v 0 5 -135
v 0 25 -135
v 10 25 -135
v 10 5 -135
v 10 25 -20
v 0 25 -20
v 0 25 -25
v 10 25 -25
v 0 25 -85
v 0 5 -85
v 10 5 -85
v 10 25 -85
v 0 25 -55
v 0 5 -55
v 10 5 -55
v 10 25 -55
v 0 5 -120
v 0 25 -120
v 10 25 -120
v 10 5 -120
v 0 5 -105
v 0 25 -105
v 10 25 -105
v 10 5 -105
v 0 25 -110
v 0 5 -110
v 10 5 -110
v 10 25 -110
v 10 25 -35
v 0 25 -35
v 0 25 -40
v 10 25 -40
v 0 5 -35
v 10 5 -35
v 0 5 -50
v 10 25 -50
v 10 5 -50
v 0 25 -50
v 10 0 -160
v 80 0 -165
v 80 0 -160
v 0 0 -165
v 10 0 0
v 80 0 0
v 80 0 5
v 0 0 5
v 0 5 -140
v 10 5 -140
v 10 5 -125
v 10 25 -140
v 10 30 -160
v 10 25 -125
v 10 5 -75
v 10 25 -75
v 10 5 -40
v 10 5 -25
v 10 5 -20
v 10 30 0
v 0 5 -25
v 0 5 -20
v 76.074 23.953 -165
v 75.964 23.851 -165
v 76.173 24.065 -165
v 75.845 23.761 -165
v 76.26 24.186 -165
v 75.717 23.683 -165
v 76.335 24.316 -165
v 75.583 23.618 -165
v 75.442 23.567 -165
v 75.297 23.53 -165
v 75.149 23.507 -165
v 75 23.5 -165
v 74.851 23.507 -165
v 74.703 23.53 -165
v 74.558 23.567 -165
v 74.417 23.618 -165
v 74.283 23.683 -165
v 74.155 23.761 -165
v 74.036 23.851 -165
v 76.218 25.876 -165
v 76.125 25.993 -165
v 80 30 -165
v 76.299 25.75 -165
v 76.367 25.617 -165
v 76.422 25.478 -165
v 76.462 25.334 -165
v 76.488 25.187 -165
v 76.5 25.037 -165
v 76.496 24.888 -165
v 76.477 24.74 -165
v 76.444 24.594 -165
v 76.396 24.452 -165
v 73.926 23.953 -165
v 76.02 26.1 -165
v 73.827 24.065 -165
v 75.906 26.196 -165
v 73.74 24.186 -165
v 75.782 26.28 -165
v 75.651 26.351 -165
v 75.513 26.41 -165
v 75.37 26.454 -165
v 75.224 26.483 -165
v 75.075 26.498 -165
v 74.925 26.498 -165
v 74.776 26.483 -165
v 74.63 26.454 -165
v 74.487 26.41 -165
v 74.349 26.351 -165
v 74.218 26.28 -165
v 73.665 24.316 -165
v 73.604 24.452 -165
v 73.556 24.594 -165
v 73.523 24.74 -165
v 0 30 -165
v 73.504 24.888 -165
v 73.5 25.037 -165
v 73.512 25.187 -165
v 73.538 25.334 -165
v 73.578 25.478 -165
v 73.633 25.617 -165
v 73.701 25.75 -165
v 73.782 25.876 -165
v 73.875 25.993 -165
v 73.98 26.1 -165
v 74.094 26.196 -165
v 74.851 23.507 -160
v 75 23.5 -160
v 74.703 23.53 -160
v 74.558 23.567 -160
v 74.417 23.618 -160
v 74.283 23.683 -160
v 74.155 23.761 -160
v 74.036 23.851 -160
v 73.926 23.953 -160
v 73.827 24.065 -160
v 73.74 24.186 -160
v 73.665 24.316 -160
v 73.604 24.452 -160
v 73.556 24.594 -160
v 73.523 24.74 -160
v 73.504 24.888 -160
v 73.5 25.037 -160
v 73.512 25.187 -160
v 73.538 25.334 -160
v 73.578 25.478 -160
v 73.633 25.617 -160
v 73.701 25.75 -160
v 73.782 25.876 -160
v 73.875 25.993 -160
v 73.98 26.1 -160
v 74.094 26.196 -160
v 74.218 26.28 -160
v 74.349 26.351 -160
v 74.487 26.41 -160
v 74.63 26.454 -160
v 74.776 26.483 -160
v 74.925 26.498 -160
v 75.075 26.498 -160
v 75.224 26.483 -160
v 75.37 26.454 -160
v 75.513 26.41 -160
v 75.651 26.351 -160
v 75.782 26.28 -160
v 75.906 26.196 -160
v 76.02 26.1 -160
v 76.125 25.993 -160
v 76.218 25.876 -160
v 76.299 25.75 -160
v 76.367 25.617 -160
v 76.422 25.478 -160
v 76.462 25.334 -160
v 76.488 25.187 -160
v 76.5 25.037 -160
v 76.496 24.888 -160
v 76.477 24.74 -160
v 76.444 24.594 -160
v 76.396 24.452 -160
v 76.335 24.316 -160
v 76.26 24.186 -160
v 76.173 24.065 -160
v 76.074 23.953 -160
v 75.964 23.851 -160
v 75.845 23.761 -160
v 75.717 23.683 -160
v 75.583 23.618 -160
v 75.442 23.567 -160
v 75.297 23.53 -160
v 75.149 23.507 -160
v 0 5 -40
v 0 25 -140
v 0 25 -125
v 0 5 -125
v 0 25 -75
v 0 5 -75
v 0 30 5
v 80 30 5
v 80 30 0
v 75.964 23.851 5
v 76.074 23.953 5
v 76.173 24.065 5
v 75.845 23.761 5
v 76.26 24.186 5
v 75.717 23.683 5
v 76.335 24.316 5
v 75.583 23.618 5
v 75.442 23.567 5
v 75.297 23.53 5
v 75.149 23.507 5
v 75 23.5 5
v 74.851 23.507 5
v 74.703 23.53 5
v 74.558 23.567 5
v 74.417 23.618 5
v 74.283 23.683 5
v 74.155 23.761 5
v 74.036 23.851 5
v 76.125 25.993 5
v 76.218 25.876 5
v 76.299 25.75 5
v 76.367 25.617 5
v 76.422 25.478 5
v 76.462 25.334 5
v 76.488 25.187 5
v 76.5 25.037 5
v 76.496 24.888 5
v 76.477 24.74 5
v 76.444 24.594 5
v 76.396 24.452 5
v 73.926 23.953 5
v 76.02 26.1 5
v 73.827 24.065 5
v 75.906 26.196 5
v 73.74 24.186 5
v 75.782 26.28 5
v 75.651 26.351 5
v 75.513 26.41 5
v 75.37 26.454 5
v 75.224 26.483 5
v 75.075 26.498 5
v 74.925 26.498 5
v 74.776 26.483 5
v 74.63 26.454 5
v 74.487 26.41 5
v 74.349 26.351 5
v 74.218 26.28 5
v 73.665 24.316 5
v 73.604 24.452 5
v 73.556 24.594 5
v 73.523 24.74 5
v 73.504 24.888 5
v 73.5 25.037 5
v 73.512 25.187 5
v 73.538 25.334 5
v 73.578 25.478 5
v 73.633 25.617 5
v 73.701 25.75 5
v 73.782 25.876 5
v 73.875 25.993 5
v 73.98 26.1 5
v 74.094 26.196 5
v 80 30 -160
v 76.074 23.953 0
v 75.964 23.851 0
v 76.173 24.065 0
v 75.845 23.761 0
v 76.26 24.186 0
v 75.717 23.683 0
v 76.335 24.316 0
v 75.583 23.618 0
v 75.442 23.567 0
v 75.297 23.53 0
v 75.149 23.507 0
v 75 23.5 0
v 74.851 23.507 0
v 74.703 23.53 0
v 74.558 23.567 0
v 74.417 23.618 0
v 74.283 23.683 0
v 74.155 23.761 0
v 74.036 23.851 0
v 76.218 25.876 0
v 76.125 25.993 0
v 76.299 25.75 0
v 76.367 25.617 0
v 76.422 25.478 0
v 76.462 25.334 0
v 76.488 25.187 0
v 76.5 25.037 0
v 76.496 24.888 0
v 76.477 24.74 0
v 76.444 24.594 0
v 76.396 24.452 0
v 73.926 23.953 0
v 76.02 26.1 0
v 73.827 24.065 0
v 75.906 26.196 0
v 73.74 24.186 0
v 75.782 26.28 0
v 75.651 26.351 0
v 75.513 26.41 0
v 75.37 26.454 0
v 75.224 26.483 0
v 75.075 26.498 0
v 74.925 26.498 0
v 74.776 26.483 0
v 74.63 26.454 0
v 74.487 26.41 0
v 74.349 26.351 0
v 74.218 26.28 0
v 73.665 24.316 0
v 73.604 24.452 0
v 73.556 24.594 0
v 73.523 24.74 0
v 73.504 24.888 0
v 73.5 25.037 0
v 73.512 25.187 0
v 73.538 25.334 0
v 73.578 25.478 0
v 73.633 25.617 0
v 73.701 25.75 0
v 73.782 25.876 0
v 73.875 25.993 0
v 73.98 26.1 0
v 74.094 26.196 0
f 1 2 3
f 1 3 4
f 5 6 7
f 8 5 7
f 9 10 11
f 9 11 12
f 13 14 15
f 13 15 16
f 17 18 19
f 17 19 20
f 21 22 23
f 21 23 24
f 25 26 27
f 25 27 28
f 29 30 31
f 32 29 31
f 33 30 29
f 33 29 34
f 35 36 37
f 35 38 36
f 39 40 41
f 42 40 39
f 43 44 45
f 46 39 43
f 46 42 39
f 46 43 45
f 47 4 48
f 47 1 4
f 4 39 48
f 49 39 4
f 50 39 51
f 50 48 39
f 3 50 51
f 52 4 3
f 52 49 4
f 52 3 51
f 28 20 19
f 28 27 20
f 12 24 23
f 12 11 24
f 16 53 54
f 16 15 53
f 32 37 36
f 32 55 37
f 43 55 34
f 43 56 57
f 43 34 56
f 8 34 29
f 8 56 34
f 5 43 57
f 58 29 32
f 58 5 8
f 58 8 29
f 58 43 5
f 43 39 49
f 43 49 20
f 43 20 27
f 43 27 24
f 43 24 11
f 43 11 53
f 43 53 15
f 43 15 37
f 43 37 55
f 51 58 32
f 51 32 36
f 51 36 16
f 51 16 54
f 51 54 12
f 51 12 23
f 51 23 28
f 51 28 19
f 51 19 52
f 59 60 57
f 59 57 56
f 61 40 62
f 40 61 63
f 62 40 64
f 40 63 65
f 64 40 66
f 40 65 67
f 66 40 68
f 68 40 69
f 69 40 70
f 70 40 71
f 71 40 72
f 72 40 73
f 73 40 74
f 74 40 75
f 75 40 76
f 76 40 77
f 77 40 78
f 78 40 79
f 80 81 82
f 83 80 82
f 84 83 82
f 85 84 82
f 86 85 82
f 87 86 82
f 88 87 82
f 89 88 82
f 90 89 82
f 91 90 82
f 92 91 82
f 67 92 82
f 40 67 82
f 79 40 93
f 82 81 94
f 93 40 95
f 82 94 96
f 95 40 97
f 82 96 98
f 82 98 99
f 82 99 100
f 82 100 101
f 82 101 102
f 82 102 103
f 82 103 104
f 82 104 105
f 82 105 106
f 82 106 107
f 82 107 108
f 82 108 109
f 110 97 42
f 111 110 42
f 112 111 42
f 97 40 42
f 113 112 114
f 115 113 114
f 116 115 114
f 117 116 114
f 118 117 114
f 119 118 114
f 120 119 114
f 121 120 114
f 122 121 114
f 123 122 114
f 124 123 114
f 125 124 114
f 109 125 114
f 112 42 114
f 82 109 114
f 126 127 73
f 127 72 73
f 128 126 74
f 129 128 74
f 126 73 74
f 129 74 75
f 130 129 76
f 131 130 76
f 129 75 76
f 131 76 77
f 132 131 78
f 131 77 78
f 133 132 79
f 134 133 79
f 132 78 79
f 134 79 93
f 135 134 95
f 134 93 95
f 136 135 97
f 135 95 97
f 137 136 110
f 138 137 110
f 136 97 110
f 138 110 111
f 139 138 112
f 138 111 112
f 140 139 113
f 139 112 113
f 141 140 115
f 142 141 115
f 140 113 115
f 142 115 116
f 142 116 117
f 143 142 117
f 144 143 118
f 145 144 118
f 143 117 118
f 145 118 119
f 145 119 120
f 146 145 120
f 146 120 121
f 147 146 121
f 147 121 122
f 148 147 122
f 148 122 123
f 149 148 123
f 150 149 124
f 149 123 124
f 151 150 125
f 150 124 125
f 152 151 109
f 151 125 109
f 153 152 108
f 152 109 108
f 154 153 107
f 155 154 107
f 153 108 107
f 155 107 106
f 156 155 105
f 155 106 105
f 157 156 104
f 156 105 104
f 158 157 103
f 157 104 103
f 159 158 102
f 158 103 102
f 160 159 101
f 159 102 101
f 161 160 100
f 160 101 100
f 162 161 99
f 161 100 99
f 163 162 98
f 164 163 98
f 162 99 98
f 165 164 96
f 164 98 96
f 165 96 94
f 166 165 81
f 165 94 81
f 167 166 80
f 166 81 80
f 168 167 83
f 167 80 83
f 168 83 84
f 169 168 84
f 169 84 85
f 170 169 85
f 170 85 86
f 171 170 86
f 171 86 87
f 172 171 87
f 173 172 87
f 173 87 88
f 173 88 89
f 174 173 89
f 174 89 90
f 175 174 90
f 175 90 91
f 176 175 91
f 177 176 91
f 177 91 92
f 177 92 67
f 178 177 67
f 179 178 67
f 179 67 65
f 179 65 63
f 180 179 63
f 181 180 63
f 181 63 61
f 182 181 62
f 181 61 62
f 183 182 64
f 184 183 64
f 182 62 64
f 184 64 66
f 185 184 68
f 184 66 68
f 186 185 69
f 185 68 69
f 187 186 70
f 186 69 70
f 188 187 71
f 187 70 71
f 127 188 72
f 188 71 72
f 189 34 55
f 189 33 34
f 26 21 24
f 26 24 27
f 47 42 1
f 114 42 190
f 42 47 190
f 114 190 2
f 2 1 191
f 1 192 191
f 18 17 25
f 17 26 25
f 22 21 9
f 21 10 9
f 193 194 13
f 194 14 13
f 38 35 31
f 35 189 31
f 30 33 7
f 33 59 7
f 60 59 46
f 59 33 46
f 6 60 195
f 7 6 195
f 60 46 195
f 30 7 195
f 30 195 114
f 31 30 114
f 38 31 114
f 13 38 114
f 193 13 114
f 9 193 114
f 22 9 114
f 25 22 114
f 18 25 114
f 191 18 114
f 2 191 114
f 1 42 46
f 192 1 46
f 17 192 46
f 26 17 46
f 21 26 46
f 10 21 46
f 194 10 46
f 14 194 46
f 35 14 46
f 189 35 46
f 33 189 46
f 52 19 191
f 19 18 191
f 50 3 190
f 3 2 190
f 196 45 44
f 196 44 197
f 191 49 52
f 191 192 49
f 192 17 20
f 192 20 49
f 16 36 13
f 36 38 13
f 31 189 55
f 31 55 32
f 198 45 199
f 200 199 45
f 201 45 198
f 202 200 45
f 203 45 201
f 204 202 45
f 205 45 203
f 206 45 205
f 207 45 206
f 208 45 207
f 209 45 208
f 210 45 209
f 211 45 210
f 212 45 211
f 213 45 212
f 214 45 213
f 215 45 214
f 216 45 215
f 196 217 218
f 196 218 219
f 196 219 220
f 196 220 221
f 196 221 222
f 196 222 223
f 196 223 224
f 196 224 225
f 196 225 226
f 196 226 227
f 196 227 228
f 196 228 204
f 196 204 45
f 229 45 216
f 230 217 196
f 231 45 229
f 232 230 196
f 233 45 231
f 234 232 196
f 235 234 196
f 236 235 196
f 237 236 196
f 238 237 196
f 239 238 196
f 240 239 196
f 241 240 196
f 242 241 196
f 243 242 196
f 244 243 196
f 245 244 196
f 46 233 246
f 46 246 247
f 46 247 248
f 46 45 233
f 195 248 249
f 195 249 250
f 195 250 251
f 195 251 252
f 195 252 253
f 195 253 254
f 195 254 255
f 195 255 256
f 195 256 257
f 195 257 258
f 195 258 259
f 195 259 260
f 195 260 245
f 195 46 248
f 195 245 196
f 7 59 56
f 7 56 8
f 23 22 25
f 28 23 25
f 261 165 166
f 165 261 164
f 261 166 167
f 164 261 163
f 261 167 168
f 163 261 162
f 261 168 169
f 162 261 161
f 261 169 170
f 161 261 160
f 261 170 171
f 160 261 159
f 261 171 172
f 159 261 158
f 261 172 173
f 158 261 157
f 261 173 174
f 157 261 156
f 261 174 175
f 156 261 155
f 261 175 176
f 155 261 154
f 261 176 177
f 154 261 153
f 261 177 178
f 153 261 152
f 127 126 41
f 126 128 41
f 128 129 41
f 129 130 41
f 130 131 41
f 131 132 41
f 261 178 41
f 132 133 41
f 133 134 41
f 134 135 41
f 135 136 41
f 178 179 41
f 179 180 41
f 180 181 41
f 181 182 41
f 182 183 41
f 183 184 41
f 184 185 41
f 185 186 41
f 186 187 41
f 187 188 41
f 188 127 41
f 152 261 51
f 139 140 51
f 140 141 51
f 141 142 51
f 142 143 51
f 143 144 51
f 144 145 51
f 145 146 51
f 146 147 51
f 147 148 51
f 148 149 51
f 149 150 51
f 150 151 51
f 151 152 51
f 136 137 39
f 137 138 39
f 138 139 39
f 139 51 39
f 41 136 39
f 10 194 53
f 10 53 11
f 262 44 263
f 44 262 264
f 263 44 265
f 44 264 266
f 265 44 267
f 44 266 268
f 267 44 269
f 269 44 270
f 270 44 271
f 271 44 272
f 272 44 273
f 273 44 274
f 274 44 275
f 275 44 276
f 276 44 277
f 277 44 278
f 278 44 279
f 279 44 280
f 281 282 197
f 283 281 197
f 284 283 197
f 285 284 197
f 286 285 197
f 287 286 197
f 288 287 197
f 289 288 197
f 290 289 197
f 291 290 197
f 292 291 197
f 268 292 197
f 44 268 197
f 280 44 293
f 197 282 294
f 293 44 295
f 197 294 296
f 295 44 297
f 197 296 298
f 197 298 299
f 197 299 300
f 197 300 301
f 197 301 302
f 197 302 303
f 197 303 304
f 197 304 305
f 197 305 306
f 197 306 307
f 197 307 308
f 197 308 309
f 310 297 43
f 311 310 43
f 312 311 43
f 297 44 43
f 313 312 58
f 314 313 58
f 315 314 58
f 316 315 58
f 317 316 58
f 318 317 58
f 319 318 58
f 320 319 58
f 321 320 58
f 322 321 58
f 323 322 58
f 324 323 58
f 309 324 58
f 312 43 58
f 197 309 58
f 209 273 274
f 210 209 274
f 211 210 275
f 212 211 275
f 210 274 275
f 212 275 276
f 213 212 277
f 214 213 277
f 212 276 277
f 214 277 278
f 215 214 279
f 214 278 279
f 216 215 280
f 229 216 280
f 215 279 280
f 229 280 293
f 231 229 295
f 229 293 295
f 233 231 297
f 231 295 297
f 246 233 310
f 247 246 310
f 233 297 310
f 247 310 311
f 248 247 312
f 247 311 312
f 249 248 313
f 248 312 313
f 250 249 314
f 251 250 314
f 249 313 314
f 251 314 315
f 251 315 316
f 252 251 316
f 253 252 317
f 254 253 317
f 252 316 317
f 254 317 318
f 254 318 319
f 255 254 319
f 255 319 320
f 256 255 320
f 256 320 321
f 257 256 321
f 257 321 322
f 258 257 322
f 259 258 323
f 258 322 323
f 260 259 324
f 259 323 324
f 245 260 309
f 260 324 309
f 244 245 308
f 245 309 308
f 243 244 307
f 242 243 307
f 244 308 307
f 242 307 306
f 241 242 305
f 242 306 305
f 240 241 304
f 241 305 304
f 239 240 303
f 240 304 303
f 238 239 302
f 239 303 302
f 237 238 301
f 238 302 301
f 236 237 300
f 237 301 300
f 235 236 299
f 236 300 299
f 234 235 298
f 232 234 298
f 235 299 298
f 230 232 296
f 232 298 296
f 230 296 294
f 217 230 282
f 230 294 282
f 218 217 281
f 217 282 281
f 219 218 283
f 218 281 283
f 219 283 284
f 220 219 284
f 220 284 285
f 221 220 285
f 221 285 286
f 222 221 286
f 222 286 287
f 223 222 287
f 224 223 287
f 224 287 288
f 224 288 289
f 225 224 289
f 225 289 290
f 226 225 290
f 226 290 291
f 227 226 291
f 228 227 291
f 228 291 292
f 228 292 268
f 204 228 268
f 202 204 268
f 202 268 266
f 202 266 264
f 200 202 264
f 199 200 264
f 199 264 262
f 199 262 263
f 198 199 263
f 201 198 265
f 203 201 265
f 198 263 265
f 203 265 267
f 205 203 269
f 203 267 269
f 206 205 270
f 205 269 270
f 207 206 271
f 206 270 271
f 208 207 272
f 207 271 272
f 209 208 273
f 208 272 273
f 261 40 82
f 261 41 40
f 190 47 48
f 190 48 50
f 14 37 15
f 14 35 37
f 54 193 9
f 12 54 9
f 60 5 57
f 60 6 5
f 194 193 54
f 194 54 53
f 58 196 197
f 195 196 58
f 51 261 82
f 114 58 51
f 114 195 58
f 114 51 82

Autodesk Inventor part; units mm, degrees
ref_plane "YZ Plane" through (0, 0, 0) normal (1, 0, 0) x (0, 1, 0)
ref_plane "XZ Plane" through (0, 0, 0) normal (0, 1, 0) x (-1, 0, 0)
ref_plane "XY Plane" through (0, 0, 0) normal (0, 0, 1) x (1, 0, 0)
sketch "Sketch1" plane through (0, 0, 0) normal (1, 0, 0) x (0, 1, 0)
  line L0 (0, 0) -> (30, 0)
  line L1 (30, 0) -> (30, -160)
  line L2 (30, -160) -> (0, -160)
  line L3 (0, -160) -> (0, 0)
  line L4 (25, -20) -> (5, -20)
  line L5 (0, -20) -> (0, -25)
  line L6 (5, -25) -> (25, -25)
  line L7 (30, -25) -> (30, -20)
  line L8 (25, -35) -> (5, -35)
  line L9 (0, -35) -> (0, -40)
  line L10 (5, -40) -> (25, -40)
  line L11 (30, -40) -> (30, -35)
  line L12 (25, -50) -> (5, -50)
  line L13 (0, -50) -> (0, -55)
  line L14 (5, -55) -> (25, -55)
  line L15 (30, -55) -> (30, -50)
  line L16 (25, -75) -> (5, -75)
  line L17 (0, -75) -> (0, -85)
  line L18 (5, -85) -> (25, -85)
  line L19 (30, -85) -> (30, -75)
  line L20 (25, -105) -> (5, -105)
  line L21 (0, -105) -> (0, -110)
  line L22 (5, -110) -> (25, -110)
  line L23 (30, -110) -> (30, -105)
  line L24 (25, -120) -> (5, -120)
  line L25 (0, -120) -> (0, -125)
  line L26 (5, -125) -> (25, -125)
  line L27 (30, -125) -> (30, -120)
  line L28 (25, -135) -> (5, -135)
  line L29 (0, -135) -> (0, -140)
  line L30 (5, -140) -> (25, -140)
  line L31 (30, -140) -> (30, -135)
  line L32 (30, 0) -> (25, 0)
  line L33 (25, 0) -> (25, -160)
  line L34 (25, -160) -> (30, -160)
  line L35 (30, -160) -> (30, 0)
  line L36 (0, 0) -> (5, 0)
  line L37 (5, 0) -> (5, -160)
  line L38 (5, -160) -> (0, -160)
  line L39 (0, -160) -> (0, 0)
  line L40 (30, 0) -> (0, 0)
  line L41 (0, 0) -> (0, 5)
  line L42 (0, 5) -> (30, 5)
  line L43 (30, 5) -> (30, 0)
  line L44 (30, -160) -> (0, -160)
  line L45 (0, -160) -> (0, -165)
  line L46 (0, -165) -> (30, -165)
  line L47 (30, -165) -> (30, -160)
  dimension "d0" = 30
  dimension "d1" = 160
  dimension "d2" = 5
  dimension "d3" = 20
  dimension "d4" = 5
  dimension "d5" = 5
  dimension "d6" = 10
  dimension "d7" = 5
  dimension "d8" = 5
  dimension "d9" = 5
  dimension "d10" = 20
  dimension "d12" = 10
  dimension "d14" = 20
  dimension "d15" = 10
  dimension "d16" = 10
  dimension "d17" = 10
  dimension "d18" = 5
  dimension "d19" = 5
  dimension "d20" = 5
  dimension "d21" = 5
extrude "Extrusion1" add sketch "Sketch1" along normal blind 10 contours L0 L37 L2 L3 | L0 L33 L4 L37 | L0 L1 L2 L33 | L6 L33 L8 L37 | L10 L33 L12 L37 | L14 L33 L16 L37 | L18 L33 L20 L37 | L22 L33 L24 L37 | L26 L33 L28 L37 | L30 L33 L2 L37
extrude "Extrusion2" add sketch "Sketch1" along normal blind 80 contours L41 L42 L43 L0 | L2 L47 L46 L45
sketch "Sketch2" plane through (0, 0, 5) normal (0, 0, 1) x (1, 0, 0)
  line L0 (80, 30) -> (80, 0) projected
  line L1 (0, 0) -> (80, 0) projected
  point P0 (75, 25)
  dimension "d33" = 5
  dimension "d34" = 25
hole "Hole1" at (75, 25, 5) direction (0, 0, -1) diameter 3 end through all
properties part number "BONNET"
